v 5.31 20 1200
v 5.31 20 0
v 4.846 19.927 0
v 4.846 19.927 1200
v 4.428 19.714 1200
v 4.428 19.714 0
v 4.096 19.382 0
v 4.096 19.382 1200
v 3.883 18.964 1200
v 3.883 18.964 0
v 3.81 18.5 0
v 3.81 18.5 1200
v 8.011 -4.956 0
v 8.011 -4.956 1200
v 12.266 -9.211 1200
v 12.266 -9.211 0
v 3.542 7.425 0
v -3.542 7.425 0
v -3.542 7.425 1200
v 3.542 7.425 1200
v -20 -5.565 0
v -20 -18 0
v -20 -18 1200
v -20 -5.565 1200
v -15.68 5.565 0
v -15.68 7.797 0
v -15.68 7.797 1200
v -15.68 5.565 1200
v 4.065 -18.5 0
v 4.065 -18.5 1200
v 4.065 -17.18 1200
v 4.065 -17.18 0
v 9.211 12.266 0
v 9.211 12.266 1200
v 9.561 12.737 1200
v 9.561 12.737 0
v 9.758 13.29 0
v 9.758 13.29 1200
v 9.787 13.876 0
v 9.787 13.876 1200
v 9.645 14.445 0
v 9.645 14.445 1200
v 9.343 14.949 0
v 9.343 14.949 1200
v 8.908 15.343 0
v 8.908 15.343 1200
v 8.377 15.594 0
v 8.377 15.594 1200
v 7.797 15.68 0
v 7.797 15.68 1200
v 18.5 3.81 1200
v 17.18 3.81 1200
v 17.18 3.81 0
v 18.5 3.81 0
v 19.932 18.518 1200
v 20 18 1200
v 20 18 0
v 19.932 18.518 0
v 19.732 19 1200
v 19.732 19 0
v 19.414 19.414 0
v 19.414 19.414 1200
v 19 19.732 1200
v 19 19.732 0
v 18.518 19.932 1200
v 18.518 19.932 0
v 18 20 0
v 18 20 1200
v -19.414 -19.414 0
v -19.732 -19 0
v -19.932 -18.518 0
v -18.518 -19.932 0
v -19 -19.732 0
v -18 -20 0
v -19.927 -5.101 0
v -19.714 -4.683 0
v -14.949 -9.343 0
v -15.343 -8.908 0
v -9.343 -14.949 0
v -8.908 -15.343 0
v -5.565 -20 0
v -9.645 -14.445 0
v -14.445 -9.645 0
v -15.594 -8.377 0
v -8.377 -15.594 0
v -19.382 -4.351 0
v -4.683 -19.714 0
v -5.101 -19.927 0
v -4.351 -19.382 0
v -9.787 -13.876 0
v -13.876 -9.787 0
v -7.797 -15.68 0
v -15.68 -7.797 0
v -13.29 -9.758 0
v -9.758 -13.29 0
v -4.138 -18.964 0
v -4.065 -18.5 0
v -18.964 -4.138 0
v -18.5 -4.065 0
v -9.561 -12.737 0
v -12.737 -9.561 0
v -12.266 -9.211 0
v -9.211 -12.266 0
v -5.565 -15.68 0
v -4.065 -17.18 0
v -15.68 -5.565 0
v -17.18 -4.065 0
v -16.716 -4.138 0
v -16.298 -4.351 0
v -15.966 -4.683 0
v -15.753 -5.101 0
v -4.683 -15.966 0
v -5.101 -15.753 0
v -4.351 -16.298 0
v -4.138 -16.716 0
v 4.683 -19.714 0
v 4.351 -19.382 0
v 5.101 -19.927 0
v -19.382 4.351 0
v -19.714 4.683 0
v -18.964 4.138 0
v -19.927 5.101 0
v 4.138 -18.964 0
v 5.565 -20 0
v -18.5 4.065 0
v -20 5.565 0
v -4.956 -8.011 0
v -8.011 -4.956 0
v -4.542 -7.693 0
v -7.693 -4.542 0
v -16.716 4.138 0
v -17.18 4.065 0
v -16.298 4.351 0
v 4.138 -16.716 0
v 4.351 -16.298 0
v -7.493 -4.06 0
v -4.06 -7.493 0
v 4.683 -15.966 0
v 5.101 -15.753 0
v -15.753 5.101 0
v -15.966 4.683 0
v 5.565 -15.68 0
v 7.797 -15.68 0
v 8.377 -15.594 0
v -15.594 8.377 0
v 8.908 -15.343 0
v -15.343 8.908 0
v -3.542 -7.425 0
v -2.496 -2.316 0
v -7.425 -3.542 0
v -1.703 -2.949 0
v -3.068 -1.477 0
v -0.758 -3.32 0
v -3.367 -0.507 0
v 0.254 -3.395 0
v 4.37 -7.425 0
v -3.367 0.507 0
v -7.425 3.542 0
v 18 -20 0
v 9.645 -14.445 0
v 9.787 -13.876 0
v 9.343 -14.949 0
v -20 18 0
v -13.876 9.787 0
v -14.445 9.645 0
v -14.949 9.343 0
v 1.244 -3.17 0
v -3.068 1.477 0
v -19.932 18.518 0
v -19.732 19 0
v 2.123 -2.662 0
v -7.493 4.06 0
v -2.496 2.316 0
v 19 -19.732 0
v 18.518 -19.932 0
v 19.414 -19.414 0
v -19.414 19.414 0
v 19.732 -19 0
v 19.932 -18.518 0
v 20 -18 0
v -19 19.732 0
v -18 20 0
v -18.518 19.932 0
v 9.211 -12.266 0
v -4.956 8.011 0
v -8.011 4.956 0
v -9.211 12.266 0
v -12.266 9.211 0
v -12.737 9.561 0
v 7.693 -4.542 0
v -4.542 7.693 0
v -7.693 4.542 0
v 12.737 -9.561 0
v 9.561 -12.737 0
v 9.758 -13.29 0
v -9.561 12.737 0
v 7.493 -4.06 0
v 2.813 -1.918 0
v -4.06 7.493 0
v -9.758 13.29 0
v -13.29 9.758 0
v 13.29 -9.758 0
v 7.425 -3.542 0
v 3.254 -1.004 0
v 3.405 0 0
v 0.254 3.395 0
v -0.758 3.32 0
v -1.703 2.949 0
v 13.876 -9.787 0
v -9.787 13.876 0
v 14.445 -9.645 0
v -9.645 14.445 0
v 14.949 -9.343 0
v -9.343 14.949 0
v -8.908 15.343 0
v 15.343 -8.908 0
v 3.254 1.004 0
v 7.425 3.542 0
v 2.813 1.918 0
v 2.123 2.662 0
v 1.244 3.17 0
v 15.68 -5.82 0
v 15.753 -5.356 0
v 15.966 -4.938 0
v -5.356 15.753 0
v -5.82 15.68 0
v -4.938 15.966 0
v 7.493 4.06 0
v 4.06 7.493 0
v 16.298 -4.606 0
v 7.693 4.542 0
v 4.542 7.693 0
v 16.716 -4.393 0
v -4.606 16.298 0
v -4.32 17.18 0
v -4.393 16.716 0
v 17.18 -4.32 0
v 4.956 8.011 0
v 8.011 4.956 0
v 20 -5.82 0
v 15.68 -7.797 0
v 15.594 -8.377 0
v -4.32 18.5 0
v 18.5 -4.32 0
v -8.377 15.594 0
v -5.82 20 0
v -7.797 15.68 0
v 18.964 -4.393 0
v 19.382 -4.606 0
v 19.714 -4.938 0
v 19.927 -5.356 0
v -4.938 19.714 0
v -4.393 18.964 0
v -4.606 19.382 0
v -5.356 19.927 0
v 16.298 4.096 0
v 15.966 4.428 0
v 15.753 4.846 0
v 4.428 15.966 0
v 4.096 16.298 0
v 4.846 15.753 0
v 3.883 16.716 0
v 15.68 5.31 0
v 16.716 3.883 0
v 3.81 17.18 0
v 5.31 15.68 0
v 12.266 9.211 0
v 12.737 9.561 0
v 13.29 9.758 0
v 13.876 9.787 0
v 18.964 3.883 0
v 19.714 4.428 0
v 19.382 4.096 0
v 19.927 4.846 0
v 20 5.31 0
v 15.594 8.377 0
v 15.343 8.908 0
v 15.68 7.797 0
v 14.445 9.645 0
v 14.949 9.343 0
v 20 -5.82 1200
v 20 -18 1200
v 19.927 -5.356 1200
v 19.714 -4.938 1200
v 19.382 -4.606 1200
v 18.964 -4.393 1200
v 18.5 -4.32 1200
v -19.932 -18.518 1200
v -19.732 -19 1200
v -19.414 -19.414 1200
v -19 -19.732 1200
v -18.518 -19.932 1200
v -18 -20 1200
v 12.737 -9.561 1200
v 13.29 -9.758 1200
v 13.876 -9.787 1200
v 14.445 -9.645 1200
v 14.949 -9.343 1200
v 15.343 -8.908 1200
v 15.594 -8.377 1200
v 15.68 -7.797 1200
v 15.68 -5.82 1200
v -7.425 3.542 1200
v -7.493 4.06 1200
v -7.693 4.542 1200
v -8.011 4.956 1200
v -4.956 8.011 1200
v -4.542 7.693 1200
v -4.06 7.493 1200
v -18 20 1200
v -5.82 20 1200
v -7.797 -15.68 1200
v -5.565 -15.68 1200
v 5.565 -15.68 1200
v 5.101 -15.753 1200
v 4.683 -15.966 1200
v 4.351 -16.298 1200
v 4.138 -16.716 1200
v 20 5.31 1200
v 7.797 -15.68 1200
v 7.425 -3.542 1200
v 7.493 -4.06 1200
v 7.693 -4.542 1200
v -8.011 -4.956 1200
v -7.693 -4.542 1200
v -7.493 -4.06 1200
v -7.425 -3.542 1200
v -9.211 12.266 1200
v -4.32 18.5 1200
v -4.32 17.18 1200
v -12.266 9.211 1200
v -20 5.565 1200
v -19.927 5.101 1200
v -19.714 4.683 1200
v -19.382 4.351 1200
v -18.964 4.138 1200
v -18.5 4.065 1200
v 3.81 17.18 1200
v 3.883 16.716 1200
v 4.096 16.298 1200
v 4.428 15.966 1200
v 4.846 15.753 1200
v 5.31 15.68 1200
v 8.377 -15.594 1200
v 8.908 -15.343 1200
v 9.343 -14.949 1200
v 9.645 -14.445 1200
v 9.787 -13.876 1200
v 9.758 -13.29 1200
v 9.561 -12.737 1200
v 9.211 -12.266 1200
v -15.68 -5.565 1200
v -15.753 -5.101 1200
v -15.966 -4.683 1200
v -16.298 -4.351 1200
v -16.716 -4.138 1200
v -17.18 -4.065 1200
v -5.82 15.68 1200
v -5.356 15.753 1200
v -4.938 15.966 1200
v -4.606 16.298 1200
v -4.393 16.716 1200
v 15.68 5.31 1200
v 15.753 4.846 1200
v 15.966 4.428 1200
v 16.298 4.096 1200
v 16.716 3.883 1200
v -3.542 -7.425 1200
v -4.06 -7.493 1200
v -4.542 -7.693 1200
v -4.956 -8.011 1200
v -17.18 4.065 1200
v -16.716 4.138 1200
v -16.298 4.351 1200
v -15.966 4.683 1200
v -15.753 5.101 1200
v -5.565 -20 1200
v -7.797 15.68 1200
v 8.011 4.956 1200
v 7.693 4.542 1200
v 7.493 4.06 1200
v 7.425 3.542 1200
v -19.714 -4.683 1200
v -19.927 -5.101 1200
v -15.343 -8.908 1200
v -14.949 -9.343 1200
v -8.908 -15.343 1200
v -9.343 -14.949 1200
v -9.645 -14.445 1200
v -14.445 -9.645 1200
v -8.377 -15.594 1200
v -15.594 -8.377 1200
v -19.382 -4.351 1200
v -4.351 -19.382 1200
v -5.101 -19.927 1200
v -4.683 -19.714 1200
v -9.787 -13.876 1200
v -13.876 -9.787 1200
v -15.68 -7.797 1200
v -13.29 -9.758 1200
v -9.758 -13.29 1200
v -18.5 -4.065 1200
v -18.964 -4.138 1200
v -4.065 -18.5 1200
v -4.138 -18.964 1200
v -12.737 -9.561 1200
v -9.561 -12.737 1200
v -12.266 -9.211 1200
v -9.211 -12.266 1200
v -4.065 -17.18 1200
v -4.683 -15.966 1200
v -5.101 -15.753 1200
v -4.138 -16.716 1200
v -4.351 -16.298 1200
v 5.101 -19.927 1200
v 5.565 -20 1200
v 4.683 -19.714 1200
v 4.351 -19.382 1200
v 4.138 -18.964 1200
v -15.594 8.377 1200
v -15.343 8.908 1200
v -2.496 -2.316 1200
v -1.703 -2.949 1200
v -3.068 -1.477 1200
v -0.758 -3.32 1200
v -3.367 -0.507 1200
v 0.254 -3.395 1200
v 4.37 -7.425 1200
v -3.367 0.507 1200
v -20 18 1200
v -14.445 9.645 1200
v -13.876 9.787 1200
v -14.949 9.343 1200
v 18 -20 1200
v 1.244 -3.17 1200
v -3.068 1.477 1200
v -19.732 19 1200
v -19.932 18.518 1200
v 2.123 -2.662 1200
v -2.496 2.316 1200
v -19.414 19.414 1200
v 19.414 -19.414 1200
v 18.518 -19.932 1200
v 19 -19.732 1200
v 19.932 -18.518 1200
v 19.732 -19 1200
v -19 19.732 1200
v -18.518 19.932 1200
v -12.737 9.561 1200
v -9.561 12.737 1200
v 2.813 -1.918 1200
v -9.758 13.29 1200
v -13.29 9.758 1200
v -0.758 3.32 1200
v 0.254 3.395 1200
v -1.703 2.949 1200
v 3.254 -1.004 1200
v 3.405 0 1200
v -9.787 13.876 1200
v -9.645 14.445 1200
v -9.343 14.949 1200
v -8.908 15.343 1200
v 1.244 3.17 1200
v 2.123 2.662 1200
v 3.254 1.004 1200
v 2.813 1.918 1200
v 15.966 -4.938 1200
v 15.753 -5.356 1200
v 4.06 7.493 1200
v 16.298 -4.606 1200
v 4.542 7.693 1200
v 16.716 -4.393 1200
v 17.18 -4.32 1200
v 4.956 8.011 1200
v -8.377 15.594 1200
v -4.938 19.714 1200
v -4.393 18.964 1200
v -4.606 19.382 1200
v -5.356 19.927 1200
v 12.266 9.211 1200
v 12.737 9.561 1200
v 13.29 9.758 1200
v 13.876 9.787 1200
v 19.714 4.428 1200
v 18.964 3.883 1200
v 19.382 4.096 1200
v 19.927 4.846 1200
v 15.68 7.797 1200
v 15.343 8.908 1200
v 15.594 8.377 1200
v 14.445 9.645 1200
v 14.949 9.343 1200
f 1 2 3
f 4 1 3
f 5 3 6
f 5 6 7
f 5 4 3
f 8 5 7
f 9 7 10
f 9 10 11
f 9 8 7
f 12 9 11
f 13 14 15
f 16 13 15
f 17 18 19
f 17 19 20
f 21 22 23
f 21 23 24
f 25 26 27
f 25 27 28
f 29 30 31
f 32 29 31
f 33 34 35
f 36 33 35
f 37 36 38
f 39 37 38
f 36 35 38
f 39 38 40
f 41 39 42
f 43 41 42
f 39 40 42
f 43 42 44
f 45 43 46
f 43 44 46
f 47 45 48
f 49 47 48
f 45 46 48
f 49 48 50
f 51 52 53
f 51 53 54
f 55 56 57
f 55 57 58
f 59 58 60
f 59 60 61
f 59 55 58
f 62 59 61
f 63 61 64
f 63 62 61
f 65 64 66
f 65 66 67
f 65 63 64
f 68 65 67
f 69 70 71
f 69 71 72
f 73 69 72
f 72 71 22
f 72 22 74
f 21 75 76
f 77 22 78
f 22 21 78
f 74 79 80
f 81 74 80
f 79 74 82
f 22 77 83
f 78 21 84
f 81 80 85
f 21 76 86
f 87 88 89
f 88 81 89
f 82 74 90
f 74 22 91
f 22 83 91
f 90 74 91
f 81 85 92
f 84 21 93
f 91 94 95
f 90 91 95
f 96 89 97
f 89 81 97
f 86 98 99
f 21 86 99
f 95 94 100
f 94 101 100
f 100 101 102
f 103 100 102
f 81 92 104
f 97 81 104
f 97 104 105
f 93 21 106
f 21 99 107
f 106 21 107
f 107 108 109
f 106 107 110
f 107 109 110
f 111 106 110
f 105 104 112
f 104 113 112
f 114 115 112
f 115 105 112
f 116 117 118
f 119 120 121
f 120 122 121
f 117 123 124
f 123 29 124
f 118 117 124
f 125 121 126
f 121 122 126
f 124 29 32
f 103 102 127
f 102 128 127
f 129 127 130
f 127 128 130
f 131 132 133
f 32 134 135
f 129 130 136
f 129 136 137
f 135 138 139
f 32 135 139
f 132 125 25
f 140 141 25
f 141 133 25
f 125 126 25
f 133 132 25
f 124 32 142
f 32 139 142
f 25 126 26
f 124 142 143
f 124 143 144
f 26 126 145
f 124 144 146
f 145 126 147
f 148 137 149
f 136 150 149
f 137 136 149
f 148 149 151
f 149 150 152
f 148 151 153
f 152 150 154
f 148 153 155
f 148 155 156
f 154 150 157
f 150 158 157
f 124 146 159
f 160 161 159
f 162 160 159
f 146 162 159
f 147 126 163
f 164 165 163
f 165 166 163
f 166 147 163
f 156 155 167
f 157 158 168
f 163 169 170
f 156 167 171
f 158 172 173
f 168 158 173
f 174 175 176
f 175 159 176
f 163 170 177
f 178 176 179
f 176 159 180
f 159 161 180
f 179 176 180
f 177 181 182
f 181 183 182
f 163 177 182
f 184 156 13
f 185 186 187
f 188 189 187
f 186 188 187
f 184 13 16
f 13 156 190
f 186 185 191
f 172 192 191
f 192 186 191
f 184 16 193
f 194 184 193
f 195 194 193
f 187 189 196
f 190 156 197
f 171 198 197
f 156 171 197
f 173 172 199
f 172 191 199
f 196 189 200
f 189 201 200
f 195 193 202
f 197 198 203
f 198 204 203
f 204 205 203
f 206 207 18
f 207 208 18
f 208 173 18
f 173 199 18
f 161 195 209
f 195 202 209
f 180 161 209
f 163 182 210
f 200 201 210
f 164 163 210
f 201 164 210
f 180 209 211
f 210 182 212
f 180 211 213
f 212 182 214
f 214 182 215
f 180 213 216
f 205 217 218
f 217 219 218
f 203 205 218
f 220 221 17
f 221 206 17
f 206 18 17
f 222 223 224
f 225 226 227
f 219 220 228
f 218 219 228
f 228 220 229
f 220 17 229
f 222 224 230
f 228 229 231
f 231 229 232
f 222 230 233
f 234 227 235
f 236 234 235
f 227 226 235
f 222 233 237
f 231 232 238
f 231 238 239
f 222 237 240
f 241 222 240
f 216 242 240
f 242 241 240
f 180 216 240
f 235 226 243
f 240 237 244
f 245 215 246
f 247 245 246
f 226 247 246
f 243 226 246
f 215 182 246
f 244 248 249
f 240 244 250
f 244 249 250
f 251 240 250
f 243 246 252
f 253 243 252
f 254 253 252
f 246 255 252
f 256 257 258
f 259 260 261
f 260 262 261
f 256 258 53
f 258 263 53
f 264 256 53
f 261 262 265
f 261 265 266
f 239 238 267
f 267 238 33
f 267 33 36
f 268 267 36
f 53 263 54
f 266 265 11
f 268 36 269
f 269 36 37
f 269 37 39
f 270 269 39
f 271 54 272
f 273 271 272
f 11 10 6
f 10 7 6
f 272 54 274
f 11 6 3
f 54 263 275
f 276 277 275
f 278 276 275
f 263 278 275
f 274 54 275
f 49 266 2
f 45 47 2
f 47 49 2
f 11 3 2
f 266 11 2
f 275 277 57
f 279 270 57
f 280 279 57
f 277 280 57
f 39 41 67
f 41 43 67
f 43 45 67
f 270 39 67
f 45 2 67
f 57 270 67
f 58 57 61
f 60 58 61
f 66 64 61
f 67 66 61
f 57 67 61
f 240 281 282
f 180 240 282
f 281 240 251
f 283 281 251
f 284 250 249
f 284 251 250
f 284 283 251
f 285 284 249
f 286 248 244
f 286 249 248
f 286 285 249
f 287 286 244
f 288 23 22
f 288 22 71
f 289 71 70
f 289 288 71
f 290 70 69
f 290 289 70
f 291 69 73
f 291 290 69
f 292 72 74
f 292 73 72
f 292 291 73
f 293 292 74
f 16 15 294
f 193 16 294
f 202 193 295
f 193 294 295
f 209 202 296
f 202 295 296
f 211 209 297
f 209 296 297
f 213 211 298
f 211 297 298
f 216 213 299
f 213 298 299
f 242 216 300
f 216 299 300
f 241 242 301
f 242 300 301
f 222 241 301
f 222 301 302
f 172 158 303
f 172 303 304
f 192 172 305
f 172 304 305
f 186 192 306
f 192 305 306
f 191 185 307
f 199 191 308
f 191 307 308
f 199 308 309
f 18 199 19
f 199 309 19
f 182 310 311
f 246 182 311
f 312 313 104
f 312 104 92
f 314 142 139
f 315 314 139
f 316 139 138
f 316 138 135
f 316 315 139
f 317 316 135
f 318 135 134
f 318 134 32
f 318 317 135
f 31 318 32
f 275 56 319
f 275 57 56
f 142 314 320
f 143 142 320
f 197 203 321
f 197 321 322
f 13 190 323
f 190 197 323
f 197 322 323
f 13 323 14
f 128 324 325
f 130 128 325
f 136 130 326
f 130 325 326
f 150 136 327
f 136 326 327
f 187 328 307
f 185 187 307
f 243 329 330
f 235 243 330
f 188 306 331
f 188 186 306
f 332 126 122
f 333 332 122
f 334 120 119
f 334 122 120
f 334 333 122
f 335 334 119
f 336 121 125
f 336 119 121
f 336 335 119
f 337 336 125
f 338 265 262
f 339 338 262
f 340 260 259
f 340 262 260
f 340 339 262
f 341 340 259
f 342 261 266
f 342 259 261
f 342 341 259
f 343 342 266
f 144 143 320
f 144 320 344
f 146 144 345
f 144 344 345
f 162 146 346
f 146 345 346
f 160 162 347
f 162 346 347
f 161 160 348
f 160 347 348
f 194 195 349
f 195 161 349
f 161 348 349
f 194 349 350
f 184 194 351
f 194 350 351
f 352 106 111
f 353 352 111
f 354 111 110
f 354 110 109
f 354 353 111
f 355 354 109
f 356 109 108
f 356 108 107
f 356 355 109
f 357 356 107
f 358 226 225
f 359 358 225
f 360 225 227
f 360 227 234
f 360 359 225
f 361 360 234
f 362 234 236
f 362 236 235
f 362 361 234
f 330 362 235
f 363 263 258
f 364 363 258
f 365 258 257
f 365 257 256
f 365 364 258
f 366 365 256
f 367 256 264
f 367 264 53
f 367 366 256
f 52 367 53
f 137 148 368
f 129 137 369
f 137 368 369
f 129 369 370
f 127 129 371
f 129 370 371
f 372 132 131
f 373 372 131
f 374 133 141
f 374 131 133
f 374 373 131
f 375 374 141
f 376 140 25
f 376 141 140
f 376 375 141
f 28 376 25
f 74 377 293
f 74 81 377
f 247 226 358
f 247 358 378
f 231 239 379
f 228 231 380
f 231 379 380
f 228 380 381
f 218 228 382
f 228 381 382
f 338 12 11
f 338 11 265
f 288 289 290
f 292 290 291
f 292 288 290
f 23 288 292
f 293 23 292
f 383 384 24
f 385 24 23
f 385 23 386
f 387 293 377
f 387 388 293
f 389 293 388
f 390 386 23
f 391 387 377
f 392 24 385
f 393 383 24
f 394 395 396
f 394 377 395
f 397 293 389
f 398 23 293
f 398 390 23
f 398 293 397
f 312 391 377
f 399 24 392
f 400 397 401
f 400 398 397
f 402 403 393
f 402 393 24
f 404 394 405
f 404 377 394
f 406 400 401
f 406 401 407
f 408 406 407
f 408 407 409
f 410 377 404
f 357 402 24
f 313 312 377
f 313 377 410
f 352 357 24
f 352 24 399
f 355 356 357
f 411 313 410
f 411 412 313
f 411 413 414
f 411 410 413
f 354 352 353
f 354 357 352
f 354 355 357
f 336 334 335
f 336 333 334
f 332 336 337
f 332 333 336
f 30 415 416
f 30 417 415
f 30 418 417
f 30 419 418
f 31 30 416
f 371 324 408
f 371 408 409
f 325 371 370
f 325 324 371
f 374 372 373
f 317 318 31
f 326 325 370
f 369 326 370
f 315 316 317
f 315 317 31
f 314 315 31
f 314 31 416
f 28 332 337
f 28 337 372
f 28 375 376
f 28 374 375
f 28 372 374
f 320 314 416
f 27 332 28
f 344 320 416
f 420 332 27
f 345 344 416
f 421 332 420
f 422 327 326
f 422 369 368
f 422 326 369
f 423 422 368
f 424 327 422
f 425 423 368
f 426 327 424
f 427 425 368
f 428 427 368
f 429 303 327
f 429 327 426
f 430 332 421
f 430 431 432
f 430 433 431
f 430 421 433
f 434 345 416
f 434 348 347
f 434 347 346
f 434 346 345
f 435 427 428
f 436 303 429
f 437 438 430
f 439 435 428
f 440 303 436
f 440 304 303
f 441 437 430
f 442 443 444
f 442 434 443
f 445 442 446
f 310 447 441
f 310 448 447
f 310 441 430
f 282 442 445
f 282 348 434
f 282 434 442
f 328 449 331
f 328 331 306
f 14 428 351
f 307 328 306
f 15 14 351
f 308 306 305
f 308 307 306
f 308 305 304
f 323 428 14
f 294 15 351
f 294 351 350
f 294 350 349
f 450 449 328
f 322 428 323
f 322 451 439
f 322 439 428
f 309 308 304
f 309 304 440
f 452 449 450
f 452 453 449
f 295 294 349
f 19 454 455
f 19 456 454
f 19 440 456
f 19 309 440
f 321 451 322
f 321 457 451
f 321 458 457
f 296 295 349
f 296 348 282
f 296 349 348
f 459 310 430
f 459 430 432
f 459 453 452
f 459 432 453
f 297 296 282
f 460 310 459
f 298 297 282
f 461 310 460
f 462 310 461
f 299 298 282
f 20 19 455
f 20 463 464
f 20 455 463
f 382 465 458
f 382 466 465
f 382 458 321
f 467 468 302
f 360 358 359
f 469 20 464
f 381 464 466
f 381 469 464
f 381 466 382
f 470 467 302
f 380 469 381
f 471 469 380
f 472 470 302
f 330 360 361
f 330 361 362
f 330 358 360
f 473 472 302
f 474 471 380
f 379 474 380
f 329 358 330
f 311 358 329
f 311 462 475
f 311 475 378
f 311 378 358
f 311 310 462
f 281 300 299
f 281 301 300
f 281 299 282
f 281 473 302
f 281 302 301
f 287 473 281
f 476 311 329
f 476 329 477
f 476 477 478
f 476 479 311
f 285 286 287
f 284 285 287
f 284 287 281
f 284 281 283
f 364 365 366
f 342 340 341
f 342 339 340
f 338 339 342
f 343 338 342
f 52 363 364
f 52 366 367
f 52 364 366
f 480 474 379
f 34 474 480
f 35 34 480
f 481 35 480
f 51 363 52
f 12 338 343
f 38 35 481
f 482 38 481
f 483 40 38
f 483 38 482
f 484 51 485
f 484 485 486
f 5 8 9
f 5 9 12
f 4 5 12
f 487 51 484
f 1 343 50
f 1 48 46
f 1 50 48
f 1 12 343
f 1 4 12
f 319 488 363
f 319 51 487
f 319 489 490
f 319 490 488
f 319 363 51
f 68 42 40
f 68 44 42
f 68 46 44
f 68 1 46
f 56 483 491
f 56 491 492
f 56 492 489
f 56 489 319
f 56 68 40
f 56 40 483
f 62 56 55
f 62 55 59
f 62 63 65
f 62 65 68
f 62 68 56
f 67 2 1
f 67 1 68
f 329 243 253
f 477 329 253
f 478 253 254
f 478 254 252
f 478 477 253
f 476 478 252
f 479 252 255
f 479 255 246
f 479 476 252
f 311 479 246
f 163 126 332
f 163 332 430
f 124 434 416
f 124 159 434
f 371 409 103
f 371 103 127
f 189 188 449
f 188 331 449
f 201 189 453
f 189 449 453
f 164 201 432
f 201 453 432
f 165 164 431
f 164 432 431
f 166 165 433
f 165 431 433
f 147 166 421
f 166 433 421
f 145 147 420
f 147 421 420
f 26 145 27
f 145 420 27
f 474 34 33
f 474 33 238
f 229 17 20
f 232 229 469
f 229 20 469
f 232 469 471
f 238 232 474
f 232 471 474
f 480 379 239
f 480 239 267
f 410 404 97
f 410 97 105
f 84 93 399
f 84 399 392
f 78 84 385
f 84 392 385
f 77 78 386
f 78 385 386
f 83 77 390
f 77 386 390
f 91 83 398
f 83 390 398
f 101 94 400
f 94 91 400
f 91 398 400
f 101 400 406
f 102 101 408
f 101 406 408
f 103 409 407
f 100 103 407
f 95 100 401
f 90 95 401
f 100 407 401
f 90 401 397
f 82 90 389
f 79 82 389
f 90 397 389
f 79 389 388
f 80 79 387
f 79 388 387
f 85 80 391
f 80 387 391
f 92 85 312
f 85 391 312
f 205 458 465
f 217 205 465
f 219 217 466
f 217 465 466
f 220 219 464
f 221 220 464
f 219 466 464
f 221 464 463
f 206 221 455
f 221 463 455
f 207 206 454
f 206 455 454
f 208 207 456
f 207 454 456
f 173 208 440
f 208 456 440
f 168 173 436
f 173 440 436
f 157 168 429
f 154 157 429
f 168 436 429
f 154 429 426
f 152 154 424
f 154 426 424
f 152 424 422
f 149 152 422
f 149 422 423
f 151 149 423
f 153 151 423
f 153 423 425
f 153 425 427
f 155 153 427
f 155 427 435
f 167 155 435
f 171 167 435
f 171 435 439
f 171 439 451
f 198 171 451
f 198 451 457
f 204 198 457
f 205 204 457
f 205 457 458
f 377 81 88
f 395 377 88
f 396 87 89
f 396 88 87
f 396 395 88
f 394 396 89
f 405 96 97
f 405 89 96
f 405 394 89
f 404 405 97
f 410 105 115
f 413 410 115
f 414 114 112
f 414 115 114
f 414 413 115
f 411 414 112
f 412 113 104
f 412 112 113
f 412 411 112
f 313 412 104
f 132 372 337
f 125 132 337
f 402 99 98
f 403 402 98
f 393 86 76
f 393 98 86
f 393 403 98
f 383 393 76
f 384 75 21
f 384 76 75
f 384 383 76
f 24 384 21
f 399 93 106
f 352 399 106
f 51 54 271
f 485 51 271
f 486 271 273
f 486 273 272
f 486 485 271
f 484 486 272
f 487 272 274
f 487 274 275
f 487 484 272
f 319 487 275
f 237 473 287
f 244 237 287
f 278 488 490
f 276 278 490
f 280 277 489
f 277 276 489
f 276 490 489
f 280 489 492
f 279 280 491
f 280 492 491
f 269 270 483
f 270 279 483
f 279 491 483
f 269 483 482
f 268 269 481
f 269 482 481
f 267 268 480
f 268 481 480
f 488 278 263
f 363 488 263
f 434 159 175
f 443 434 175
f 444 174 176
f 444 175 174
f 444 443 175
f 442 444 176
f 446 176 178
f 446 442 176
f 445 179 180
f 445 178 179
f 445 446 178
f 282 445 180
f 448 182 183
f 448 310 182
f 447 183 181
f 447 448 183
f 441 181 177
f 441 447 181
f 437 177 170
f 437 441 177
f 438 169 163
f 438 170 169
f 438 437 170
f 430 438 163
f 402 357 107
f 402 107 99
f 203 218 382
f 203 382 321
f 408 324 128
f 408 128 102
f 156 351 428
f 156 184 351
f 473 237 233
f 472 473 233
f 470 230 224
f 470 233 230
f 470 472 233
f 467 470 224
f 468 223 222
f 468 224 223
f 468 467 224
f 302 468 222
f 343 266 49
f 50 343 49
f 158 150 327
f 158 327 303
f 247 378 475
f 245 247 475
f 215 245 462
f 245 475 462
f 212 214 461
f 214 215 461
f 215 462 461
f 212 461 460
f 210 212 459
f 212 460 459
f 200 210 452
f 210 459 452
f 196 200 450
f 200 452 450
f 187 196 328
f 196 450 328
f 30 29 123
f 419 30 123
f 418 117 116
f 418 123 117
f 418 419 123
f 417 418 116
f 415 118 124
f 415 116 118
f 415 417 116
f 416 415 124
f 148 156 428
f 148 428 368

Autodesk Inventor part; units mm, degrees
ref_plane "YZ Plane" through (0, 0, 0) normal (1, 0, 0) x (0, 1, 0)
ref_plane "XZ Plane" through (0, 0, 0) normal (0, 1, 0) x (-1, 0, 0)
ref_plane "XY Plane" through (0, 0, 0) normal (0, 0, 1) x (1, 0, 0)
sketch "Sketch1" plane through (0, 0, 0) normal (0, 0, 1) x (1, 0, 0)
  line L0 (7.425, -7.425) -> (-7.425, -7.425)
  line L1 (-7.425, -7.425) -> (-7.425, 7.425)
  line L2 (-7.425, 7.425) -> (7.425, 7.425)
  line L3 (7.425, 7.425) -> (7.425, -7.425)
  line L4 (7.425, -7.425) -> (-7.425, 7.425) construction
  line L5 (-7.425, -7.425) -> (7.425, 7.425) construction
  line L6 (20, -20) -> (-20, -20)
  line L7 (-20, -20) -> (-20, 20)
  line L8 (-20, 20) -> (20, 20)
  line L9 (20, 20) -> (20, -20)
  line L10 (20, -20) -> (-20, 20) construction
  line L11 (-20, -20) -> (20, 20) construction
  line L12 (-16.1503, -19.205) -> (19.205, 16.1503)
  line L13 (19.205, 16.1503) -> (16.1503, 19.205)
  line L14 (16.1503, 19.205) -> (-19.205, -16.1503)
  line L15 (-19.205, -16.1503) -> (-16.1503, -19.205)
  line L16 (-16.1503, -19.205) -> (16.1503, 19.205) construction
  line L17 (19.205, 16.1503) -> (-19.205, -16.1503) construction
  line L18 (16.1503, -19.205) -> (-19.205, 16.1503)
  line L19 (-19.205, 16.1503) -> (-16.1503, 19.205)
  line L20 (-16.1503, 19.205) -> (19.205, -16.1503)
  line L21 (19.205, -16.1503) -> (16.1503, -19.205)
  line L22 (16.1503, -19.205) -> (-16.1503, 19.205) construction
  line L23 (-19.205, 16.1503) -> (19.205, -16.1503) construction
  line L24 (-20, 20) -> (-15.68, 20)
  line L25 (-15.68, 20) -> (-15.68, 4.065)
  line L26 (-15.68, 4.065) -> (-20, 4.065)
  line L27 (-20, 4.065) -> (-20, 20)
  line L28 (-20, -20) -> (-15.68, -20)
  line L29 (-15.68, -20) -> (-15.68, -4.065)
  line L30 (-15.68, -4.065) -> (-20, -4.065)
  line L31 (-20, -4.065) -> (-20, -20)
  line L32 (-20, 20) -> (-4.32, 20)
  line L33 (-4.32, 20) -> (-4.32, 15.68)
  line L34 (-4.32, 15.68) -> (-20, 15.68)
  line L35 (-20, 15.68) -> (-20, 20)
  line L36 (20, 20) -> (3.81, 20)
  line L37 (3.81, 20) -> (3.81, 15.68)
  line L38 (3.81, 15.68) -> (20, 15.68)
  line L39 (20, 15.68) -> (20, 20)
  line L40 (20, -20) -> (15.68, -20)
  line L41 (15.68, -20) -> (15.68, -4.32)
  line L42 (15.68, -4.32) -> (20, -4.32)
  line L43 (20, -4.32) -> (20, -20)
  line L44 (20, -20) -> (4.065, -20)
  line L45 (4.065, -20) -> (4.065, -15.68)
  line L46 (4.065, -15.68) -> (20, -15.68)
  line L47 (20, -15.68) -> (20, -20)
  line L48 (-20, -20) -> (-4.065, -20)
  line L49 (-4.065, -20) -> (-4.065, -15.68)
  line L50 (-4.065, -15.68) -> (-20, -15.68)
  line L51 (-20, -15.68) -> (-20, -20)
  line L52 (20, 20) -> (15.68, 20)
  line L53 (15.68, 20) -> (15.68, 3.81)
  line L54 (15.68, 3.81) -> (20, 3.81)
  line L55 (20, 3.81) -> (20, 20)
  point P0 (0, 0)
  dimension "d0" = 14.85
  dimension "d1" = 14.85
  dimension "d2" = 40
  dimension "d3" = 40
  dimension "d4" = 4.32
  dimension "d5" = 4.32
  dimension "d6" = 50
  dimension "d7" = 50
  dimension "d8" = 4.32
  dimension "d10" = 4.32
  dimension "d11" = 8.13
  dimension "d12" = 4.065
  dimension "d15" = 4.32
  dimension "d16" = 4.32
  dimension "d17" = 4.32
  dimension "d18" = 4.32
  dimension "d19" = 8.13
  dimension "d20" = 8.13
  dimension "d21" = 4.065
  dimension "d22" = 4.32
  dimension "d23" = 4.32
  dimension "d24" = 4.32
  dimension "d25" = 8.13
  dimension "d26" = 4.32
  dimension "d28" = 8.255
extrude "Extrusion1" add sketch "Sketch1" along normal blind 1200 contours L3 L20 L41 L46 L18 L0 | L0 L18 L12 L20 L3 | L0 L12 L18 | L20 L12 L3 | L12 L50 L29 L14 L1 L0 | L0 L1 L14 L18 L12 | L46 L41 L18 | L18 L41 L6 L45 L46 | L18 L14 L20 L12 | L12 L20 L14 L2 L3 | L3 L2 L14 L38 L53 L12 | L41 L42 L9 L46 L20 | L20 L46 L41 | L50 L49 L6 L29 L12 | L12 L29 L50 | L41 L46 L20 L21 L18 | L18 L21 L20 L46 L9 L6 L41 | L18 L1 L2 L20 L14 | L14 L1 L18 | L53 L38 L12 | L12 L38 L9 L54 L53 | L20 L2 L14 | L29 L6 L7 L50 L14 L15 L12 | L12 L15 L14 L50 L29 | L50 L14 L29 | L18 L25 L34 L20 L2 L1 | L38 L53 L14 L13 L12 | L12 L13 L14 L53 L8 L9 L38 | L38 L14 L53 | L14 L50 L7 L30 L29 | L25 L26 L7 L34 L18 | L18 L34 L25 | L38 L37 L8 L53 L14 | L34 L25 L20 | L20 L25 L8 L33 L34 | L34 L7 L8 L25 L20 L19 L18 | L18 L19 L20 L25 L34
fillet "Fillet1" radius 2 19 edges at (12.6253, 15.68, 600) (15.68, 12.6253, 600) (20, 20, 600) (20, -20, 600) (7.425, -4.3703, 600) (7.425, 4.3703, 600) (15.68, -12.6253, 600) (12.6253, -15.68, 600) (-12.6253, -15.68, 600) (-15.68, -12.6253, 600) (-20, -20, 600) (-7.425, -4.3703, 600) (-4.3703, -7.425, 600) (-7.425, 4.3703, 600) (-4.3703, 7.425, 600) (4.3703, 7.425, 600) (-12.6253, 15.68, 600) (-20, 20, 600) (-15.68, 12.6253, 600)
fillet "Fillet1" radius 1.5 16 edges at (-15.68, 4.065, 600) (-20, 4.065, 600) (-4.32, 20, 600) (-4.32, 15.68, 600) (3.81, 15.68, 600) (3.81, 20, 600) (20, 3.81, 600) (15.68, 3.81, 600) (15.68, -4.32, 600) (20, -4.32, 600) (4.065, -20, 600) (4.065, -15.68, 600) (-4.065, -20, 600) (-4.065, -15.68, 600) (-15.68, -4.065, 600) (-20, -4.065, 600)
sketch "Sketch2" plane through (0, 0, 1200) normal (0, 0, 1) x (1, 0, 0)
  circle A0 centre (0, 0) radius 3.405
  dimension "d30" = 6.81
extrude "Extrusion2" cut sketch "Sketch2" against normal through all
sketch "Skizze3" plane through (0, 0, 1200) normal (0, 0, 1) x (1, 0, 0)
  point P0 (0, 0)
equation "\"d1\" = d0"
equation "\"d7\" = d6"
equation "\"d12\" = 0.5 * d11"
equation "\"d15\" = d8"
equation "\"d17\" = d8"
equation "\"d18\" = d8"
equation "\"d19\" = d11"
equation "\"d20\" = d19"
equation "\"d21\" = d12"
equation "\"d22\" = d8"
equation "\"d23\" = d8"
equation "\"d24\" = d8"
equation "\"d25\" = d11"
equation "\"d26\" = d8"
properties part number "4040_Alu" material "Aluminum 6061"
